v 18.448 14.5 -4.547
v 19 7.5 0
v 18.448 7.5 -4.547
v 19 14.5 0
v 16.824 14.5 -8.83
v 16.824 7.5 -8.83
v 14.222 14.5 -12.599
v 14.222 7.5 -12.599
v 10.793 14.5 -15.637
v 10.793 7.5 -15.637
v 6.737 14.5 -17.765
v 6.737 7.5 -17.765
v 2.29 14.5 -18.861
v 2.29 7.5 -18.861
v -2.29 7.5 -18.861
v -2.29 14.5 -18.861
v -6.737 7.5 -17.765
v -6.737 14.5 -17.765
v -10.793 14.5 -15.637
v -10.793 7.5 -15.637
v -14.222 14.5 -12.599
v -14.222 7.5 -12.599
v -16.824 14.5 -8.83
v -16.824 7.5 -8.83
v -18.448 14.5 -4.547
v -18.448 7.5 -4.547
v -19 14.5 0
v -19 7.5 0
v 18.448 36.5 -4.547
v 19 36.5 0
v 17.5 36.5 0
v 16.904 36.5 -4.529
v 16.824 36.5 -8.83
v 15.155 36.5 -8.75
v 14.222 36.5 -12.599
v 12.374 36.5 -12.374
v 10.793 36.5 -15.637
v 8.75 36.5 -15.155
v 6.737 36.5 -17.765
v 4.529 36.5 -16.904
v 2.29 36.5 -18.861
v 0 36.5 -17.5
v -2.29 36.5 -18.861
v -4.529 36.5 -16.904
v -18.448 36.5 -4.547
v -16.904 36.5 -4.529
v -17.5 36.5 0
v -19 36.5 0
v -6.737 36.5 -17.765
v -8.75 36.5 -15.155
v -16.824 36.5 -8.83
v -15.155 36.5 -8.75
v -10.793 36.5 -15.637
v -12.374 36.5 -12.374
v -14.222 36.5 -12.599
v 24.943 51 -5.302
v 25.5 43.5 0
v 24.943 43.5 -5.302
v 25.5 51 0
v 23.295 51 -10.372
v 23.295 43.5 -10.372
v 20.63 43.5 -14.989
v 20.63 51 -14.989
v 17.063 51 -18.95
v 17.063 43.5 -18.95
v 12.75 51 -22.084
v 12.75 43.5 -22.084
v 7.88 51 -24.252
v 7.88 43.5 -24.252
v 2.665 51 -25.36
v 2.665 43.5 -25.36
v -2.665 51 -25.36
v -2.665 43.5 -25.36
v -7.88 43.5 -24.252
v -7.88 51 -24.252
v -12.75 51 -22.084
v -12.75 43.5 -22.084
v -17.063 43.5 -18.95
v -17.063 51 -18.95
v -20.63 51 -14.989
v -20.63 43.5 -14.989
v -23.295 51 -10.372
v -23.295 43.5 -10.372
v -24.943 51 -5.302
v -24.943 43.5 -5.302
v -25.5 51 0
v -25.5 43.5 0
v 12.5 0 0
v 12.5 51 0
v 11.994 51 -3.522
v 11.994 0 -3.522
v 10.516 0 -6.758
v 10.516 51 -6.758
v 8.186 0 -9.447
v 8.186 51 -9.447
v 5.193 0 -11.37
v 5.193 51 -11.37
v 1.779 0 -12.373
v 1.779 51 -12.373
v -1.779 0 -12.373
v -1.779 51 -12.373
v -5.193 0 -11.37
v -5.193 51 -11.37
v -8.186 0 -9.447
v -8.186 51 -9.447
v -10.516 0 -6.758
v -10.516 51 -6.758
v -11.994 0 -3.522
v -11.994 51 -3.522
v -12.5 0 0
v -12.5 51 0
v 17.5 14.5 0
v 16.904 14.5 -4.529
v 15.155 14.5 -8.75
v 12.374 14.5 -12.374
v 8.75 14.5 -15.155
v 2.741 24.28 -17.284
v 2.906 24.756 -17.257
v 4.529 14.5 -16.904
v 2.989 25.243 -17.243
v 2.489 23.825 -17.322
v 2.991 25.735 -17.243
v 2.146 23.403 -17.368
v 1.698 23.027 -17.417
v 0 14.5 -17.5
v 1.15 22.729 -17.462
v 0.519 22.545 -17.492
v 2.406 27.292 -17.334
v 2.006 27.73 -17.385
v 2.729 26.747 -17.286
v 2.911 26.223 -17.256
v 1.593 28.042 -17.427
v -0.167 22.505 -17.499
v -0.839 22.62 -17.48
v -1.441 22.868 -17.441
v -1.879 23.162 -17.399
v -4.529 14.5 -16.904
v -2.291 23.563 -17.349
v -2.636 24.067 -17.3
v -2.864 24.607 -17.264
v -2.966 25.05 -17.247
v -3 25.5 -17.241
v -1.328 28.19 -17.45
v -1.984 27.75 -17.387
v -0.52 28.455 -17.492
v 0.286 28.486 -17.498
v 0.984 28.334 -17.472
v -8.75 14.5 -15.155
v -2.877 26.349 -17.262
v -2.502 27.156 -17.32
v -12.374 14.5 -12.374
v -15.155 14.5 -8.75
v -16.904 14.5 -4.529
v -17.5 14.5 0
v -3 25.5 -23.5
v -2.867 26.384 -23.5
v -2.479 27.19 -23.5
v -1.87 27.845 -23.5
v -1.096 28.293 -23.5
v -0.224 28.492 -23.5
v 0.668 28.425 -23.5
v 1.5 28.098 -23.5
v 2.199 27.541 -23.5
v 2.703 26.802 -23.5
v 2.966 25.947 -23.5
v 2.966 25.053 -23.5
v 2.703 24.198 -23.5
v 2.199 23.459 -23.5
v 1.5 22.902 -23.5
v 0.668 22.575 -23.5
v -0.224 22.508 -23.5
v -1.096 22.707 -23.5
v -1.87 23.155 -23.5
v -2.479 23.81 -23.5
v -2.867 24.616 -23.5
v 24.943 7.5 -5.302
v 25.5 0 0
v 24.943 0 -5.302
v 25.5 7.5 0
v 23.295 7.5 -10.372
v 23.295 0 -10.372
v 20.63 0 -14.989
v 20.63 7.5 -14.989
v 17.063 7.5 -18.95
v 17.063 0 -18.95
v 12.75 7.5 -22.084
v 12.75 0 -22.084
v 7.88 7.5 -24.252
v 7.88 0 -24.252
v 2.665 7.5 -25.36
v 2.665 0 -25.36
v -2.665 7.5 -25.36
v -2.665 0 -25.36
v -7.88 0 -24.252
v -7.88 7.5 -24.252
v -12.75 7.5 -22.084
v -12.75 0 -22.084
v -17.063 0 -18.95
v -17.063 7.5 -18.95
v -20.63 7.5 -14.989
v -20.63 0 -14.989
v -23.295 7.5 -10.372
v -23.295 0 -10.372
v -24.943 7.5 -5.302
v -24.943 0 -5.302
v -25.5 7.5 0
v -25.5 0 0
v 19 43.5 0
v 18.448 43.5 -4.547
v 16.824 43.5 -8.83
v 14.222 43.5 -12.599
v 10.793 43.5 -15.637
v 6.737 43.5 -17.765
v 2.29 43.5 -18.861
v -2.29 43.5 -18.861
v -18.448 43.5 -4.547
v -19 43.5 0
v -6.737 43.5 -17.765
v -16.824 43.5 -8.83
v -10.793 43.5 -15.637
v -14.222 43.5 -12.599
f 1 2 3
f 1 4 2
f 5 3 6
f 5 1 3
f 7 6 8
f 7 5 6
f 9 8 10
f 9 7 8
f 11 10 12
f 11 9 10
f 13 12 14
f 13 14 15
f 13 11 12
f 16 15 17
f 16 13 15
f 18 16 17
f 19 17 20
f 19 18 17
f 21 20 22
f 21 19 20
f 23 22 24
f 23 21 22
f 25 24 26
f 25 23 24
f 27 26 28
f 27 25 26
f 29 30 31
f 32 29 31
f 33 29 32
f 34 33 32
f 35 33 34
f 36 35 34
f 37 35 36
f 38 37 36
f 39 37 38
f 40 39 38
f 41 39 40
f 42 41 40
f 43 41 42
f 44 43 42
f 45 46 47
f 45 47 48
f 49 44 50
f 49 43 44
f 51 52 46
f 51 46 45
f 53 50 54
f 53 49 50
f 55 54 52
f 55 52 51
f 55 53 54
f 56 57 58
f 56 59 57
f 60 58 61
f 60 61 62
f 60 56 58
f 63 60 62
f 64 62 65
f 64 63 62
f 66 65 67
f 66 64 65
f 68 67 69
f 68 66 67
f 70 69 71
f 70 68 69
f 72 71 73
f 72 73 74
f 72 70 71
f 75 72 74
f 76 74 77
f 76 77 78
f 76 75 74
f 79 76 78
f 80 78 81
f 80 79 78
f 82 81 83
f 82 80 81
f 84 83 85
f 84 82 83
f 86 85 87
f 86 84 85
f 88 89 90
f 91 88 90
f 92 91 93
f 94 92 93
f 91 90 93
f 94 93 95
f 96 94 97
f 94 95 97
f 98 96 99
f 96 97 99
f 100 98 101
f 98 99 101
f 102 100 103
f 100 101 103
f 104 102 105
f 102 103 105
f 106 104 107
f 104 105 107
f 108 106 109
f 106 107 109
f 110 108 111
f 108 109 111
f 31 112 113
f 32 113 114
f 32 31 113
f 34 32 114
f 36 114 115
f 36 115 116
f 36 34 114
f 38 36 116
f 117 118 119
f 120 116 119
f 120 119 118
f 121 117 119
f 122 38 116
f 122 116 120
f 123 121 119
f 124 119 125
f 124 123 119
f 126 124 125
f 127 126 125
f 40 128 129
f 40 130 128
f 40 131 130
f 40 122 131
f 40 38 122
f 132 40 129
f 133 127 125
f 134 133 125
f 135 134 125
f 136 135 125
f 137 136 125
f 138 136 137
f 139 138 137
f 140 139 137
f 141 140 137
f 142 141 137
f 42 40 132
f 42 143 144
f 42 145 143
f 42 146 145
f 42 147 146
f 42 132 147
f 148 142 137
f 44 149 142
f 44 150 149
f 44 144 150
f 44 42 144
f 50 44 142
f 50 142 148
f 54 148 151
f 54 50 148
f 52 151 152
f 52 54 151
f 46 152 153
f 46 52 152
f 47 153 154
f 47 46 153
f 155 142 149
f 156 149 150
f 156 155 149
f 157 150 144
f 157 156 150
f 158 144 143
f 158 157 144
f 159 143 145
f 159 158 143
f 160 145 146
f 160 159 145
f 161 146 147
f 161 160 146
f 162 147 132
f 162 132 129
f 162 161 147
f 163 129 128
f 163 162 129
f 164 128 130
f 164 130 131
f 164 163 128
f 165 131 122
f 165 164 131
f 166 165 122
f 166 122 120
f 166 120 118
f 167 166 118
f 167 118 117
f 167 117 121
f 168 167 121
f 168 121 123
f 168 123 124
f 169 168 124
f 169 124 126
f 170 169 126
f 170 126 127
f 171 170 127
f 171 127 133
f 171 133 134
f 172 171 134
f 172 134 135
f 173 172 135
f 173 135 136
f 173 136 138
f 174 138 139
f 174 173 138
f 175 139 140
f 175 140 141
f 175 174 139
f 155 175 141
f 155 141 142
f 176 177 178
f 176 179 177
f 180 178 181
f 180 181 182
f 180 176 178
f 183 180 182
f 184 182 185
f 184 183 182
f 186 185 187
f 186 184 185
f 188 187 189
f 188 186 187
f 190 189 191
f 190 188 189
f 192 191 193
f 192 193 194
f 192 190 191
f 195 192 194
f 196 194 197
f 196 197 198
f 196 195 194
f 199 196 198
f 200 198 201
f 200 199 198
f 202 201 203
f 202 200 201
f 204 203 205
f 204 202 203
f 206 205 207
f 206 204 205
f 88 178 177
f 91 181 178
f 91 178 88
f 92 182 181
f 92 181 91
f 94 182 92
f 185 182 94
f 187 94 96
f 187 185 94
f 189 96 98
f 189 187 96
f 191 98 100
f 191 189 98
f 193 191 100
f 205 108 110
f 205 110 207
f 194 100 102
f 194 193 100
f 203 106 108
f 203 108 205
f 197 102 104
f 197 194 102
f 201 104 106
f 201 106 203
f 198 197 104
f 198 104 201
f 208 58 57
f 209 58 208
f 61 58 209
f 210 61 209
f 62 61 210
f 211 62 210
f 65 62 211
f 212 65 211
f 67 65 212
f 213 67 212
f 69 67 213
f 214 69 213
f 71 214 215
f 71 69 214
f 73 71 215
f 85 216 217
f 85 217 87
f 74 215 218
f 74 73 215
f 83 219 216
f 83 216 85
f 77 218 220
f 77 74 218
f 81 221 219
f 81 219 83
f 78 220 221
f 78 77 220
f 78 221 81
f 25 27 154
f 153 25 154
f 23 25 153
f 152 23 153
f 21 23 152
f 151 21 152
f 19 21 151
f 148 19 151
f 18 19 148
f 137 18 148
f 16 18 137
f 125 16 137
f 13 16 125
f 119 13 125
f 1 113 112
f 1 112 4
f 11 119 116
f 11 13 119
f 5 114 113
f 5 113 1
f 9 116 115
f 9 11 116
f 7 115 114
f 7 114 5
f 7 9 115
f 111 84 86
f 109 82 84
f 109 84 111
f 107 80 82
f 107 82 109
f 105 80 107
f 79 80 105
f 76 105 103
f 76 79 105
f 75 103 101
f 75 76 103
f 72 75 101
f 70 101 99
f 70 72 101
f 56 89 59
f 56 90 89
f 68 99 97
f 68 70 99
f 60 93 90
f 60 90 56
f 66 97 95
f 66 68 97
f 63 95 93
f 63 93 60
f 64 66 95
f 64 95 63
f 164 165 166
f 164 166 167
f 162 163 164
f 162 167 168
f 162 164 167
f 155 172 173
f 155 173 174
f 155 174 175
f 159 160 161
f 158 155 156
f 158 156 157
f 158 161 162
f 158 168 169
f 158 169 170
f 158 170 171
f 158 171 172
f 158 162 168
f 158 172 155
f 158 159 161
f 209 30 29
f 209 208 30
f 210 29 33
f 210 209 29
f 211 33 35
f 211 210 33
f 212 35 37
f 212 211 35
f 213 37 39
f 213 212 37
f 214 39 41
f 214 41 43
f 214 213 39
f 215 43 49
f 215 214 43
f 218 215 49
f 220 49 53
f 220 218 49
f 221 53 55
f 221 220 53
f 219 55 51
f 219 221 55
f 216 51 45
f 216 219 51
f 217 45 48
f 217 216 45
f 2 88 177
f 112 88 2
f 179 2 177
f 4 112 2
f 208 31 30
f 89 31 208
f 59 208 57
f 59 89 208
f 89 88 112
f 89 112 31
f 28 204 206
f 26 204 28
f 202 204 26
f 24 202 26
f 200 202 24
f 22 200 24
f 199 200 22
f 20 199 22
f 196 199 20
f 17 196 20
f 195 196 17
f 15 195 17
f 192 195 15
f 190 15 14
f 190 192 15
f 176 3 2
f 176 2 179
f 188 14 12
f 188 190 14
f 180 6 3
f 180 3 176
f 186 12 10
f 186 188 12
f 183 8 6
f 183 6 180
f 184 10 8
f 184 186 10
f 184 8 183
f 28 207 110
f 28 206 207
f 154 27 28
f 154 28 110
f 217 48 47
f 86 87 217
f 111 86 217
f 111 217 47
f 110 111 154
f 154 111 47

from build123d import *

# Parameters (mm, degrees)
REVOLVE1_ANGLE           = 180
CUT_EXTRUDE1_DEPTH       = 52
BOSS_EXTRUDE1_REACH      = 25.5
BOSS_EXTRUDE1_END_RADIUS = 17.5
SKETCH7_R                = 3


with BuildPart() as part:
    # Sketch3 → Revolve1 (revolve)
    with BuildSketch(Plane.XY):
        Polygon((0, 0), (25.5, 0), (25.5, 7.5), (19, 7.5), (19, 14.5), (17.5, 14.5), (17.5, 36.5), (19, 36.5), (19, 43.5), (25.5, 43.5), (25.5, 51), (0, 51), align=None)
    revolve(axis=Axis((0, 0, 0), (0, 1, 0)), revolution_arc=REVOLVE1_ANGLE)

    # Sketch4 → Cut-Extrude1 (cut, through all)
    with BuildSketch(Plane(origin=(0, 51, 0), x_dir=(1, 0, 0), z_dir=(0, 1, 0))):
        with BuildLine():
            Line((-12.5, 0), (12.5, 0))
            ThreePointArc((12.5, 0), (0, 12.5), (-12.5, 0))
        make_face()
    extrude(amount=-CUT_EXTRUDE1_DEPTH, mode=Mode.SUBTRACT)

    # Boss-Extrude1: up to this cylinder (the profile starts outside it)
    boss_extrude1_end = Plane(origin=(0, 25.5, 0), z_dir=(0, -1, 0)) * Cylinder(BOSS_EXTRUDE1_END_RADIUS, 87, mode=Mode.PRIVATE)
    # Sketch7 → Boss-Extrude1 (add, up to the surface)
    with BuildSketch(Plane(origin=(0, 0, -23.5), x_dir=(-1, 0, 0), z_dir=(0, 0, -1)), mode=Mode.PRIVATE) as boss_extrude1_sk1:
        with Locations((0, 25.5)):
            Circle(SKETCH7_R)
    boss_extrude1_tool1 = extrude(boss_extrude1_sk1.sketch, amount=-BOSS_EXTRUDE1_REACH, mode=Mode.PRIVATE) - boss_extrude1_end
    add(boss_extrude1_tool1.solids().sort_by_distance((0, 25.5, -23.5))[0])


solid = part.part
